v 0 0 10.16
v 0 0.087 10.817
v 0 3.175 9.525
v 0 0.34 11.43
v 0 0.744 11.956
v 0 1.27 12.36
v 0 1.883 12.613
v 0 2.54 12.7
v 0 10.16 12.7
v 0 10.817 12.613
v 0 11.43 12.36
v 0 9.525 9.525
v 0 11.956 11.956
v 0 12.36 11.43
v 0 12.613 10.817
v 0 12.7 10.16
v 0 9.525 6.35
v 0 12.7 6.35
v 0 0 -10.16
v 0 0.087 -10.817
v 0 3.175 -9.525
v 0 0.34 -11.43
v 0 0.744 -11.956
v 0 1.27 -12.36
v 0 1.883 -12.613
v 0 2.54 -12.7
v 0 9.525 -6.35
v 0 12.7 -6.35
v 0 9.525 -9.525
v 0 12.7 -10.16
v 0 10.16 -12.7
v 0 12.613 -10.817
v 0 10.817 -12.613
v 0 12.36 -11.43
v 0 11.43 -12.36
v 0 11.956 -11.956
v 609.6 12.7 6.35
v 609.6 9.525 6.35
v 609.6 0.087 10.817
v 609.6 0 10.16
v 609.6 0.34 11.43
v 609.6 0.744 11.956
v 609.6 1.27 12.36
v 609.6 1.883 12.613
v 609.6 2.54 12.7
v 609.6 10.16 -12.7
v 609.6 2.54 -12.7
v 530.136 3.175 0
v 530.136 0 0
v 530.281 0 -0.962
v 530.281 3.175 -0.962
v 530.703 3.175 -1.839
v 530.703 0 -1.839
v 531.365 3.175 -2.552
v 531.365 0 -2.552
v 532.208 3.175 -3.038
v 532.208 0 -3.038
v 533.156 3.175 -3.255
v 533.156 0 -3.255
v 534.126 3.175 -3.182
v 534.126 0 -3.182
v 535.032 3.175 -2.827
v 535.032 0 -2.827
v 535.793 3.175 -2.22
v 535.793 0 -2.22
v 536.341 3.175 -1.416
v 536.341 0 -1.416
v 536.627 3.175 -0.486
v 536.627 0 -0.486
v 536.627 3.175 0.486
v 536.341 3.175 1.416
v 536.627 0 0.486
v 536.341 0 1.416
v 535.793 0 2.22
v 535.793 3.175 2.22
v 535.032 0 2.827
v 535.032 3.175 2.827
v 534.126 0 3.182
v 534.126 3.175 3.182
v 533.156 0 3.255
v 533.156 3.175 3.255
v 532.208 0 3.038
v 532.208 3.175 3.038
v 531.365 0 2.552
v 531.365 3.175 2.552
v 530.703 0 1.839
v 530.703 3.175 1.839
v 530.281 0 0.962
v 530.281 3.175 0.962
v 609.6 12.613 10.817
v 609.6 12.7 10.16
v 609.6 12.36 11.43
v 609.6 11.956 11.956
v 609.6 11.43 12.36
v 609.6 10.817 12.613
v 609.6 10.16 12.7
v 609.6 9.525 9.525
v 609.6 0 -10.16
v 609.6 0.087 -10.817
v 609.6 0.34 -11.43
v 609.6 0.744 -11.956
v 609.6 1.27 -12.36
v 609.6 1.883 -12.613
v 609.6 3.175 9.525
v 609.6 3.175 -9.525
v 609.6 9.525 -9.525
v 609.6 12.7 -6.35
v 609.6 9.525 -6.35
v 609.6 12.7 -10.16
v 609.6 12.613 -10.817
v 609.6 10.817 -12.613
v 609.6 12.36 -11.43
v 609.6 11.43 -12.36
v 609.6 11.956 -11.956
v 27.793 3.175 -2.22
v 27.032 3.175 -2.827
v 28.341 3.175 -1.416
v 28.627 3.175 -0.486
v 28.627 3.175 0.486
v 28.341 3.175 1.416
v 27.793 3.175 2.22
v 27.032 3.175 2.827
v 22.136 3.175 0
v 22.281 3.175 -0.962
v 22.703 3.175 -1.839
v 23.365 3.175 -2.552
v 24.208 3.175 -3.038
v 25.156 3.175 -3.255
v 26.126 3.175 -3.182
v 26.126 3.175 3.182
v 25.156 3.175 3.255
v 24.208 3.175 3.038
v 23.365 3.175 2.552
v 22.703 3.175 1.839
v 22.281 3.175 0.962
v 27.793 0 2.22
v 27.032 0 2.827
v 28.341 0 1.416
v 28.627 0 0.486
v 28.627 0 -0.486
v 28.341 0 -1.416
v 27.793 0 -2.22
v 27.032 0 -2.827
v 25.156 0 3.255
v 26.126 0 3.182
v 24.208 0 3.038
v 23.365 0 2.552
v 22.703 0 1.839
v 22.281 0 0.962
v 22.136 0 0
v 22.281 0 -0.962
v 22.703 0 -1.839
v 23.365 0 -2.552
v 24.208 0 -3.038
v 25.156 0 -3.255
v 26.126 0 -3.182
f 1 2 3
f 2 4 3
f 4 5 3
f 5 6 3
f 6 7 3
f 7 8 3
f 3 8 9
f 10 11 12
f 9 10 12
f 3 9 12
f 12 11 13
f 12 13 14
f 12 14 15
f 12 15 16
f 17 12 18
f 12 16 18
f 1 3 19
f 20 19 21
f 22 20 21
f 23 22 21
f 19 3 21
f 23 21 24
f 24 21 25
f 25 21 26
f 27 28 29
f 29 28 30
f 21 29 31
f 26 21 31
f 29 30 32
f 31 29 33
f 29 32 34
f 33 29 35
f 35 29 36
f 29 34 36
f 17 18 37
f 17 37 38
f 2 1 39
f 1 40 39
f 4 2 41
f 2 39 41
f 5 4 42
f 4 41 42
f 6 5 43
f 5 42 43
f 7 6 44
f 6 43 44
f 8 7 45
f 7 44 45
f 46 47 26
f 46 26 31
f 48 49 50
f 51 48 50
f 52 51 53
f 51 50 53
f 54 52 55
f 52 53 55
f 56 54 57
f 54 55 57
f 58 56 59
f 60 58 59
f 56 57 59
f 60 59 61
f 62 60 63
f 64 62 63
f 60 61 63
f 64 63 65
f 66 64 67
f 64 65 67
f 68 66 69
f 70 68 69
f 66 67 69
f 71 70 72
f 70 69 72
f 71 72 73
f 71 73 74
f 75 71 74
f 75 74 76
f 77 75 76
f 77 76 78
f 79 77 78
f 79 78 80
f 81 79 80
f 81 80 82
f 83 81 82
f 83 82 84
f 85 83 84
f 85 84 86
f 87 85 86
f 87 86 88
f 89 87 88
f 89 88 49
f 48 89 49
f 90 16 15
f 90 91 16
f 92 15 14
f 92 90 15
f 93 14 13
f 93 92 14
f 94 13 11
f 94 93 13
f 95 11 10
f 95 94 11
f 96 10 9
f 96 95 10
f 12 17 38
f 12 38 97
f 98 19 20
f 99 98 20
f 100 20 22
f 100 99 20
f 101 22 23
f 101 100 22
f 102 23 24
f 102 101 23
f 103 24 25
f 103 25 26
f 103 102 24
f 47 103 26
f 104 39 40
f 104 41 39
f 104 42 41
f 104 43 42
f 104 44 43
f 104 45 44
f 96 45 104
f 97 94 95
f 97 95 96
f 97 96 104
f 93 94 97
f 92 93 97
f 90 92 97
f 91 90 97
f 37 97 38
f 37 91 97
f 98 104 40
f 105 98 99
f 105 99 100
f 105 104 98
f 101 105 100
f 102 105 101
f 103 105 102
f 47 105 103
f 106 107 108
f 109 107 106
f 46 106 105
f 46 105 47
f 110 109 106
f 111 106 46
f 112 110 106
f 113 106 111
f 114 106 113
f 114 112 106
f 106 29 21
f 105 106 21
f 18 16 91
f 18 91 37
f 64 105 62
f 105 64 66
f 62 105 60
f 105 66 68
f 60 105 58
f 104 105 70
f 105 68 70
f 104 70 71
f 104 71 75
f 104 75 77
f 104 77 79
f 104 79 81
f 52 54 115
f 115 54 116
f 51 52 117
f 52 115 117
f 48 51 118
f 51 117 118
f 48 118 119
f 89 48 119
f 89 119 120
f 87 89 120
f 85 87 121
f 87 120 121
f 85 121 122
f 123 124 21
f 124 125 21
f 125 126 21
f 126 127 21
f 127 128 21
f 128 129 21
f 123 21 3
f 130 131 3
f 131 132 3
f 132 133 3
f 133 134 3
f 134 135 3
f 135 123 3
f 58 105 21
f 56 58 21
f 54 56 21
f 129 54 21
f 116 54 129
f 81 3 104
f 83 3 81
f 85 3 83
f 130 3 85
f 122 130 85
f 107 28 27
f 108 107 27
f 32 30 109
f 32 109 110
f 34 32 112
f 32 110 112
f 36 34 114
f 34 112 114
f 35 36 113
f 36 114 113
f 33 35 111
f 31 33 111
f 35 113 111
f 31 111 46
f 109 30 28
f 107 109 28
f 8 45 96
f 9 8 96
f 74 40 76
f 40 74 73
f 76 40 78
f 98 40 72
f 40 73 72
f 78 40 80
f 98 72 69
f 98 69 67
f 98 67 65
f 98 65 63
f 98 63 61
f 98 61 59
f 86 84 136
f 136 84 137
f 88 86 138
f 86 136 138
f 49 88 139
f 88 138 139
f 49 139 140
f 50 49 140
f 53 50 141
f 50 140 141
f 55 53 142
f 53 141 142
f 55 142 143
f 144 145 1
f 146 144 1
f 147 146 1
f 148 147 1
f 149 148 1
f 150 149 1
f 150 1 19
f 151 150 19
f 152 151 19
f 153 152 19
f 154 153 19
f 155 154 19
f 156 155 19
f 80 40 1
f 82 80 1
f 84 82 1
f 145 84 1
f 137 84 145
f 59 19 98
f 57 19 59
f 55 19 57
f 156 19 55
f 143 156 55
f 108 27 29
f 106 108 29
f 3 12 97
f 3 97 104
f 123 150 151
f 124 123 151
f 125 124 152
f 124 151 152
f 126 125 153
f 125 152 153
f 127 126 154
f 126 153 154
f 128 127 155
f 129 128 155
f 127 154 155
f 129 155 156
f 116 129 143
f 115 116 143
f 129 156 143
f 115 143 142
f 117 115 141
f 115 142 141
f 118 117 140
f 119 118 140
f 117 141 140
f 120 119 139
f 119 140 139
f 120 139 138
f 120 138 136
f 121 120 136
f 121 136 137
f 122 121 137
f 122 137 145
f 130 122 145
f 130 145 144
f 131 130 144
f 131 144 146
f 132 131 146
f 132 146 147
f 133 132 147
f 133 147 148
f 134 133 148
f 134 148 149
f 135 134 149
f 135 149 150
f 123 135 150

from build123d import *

# Parameters (mm, degrees)
BOSS_EXTRUDE1_DEPTH         = 609.6
FILLET1_R                   = 2.54
F_1_4_CLEARANCE_HOLE1_D     = 6.5278
F_1_4_CLEARANCE_HOLE1_DEPTH = 22.352
F_1_4_CLEARANCE_HOLE1_TIP   = 1.961148974


with BuildPart() as part:
    # Sketch1 → Boss-Extrude1 (new body)
    with BuildSketch(Plane(origin=(0, 0, 0), x_dir=(0, 0, -1), z_dir=(1, 0, 0))):
        Polygon((0, 0), (-12.7, 0), (-12.7, 12.7), (-6.35, 12.7), (-6.35, 9.525), (-9.525, 9.525), (-9.525, 3.175), (0, 3.175), align=None)
    boss_extrude1 = extrude(amount=BOSS_EXTRUDE1_DEPTH)

    # Mirror1: Boss-Extrude1 across plane
    add(boss_extrude1.mirror(Plane(origin=(609.6, 3.175, 0), x_dir=(1, 0, 0), z_dir=(0, 0, 1))))

    # Fillet1
    fillet1_edges = [part.edges().sort_by_distance(p)[0] for p in [
        (304.8, 0, 12.7),
        (304.8, 12.7, 12.7),
        (304.8, 0, -12.7),
        (304.8, 12.7, -12.7),
    ]]
    fillet(fillet1_edges, radius=FILLET1_R)

    # 1/4 Clearance Hole1
    with Locations(Plane(origin=(0, 3.175, 0), x_dir=(1, 0, 0), z_dir=(0, 1, 0))):
        with Locations((25.4, 0), (533.4, 0)):
            Hole(F_1_4_CLEARANCE_HOLE1_D / 2, depth=F_1_4_CLEARANCE_HOLE1_DEPTH)
            with Locations((0, 0, -(F_1_4_CLEARANCE_HOLE1_DEPTH + F_1_4_CLEARANCE_HOLE1_TIP / 2))):  # 118° drill point
                Cone(0, F_1_4_CLEARANCE_HOLE1_D / 2, F_1_4_CLEARANCE_HOLE1_TIP, mode=Mode.SUBTRACT)


solid = part.part
